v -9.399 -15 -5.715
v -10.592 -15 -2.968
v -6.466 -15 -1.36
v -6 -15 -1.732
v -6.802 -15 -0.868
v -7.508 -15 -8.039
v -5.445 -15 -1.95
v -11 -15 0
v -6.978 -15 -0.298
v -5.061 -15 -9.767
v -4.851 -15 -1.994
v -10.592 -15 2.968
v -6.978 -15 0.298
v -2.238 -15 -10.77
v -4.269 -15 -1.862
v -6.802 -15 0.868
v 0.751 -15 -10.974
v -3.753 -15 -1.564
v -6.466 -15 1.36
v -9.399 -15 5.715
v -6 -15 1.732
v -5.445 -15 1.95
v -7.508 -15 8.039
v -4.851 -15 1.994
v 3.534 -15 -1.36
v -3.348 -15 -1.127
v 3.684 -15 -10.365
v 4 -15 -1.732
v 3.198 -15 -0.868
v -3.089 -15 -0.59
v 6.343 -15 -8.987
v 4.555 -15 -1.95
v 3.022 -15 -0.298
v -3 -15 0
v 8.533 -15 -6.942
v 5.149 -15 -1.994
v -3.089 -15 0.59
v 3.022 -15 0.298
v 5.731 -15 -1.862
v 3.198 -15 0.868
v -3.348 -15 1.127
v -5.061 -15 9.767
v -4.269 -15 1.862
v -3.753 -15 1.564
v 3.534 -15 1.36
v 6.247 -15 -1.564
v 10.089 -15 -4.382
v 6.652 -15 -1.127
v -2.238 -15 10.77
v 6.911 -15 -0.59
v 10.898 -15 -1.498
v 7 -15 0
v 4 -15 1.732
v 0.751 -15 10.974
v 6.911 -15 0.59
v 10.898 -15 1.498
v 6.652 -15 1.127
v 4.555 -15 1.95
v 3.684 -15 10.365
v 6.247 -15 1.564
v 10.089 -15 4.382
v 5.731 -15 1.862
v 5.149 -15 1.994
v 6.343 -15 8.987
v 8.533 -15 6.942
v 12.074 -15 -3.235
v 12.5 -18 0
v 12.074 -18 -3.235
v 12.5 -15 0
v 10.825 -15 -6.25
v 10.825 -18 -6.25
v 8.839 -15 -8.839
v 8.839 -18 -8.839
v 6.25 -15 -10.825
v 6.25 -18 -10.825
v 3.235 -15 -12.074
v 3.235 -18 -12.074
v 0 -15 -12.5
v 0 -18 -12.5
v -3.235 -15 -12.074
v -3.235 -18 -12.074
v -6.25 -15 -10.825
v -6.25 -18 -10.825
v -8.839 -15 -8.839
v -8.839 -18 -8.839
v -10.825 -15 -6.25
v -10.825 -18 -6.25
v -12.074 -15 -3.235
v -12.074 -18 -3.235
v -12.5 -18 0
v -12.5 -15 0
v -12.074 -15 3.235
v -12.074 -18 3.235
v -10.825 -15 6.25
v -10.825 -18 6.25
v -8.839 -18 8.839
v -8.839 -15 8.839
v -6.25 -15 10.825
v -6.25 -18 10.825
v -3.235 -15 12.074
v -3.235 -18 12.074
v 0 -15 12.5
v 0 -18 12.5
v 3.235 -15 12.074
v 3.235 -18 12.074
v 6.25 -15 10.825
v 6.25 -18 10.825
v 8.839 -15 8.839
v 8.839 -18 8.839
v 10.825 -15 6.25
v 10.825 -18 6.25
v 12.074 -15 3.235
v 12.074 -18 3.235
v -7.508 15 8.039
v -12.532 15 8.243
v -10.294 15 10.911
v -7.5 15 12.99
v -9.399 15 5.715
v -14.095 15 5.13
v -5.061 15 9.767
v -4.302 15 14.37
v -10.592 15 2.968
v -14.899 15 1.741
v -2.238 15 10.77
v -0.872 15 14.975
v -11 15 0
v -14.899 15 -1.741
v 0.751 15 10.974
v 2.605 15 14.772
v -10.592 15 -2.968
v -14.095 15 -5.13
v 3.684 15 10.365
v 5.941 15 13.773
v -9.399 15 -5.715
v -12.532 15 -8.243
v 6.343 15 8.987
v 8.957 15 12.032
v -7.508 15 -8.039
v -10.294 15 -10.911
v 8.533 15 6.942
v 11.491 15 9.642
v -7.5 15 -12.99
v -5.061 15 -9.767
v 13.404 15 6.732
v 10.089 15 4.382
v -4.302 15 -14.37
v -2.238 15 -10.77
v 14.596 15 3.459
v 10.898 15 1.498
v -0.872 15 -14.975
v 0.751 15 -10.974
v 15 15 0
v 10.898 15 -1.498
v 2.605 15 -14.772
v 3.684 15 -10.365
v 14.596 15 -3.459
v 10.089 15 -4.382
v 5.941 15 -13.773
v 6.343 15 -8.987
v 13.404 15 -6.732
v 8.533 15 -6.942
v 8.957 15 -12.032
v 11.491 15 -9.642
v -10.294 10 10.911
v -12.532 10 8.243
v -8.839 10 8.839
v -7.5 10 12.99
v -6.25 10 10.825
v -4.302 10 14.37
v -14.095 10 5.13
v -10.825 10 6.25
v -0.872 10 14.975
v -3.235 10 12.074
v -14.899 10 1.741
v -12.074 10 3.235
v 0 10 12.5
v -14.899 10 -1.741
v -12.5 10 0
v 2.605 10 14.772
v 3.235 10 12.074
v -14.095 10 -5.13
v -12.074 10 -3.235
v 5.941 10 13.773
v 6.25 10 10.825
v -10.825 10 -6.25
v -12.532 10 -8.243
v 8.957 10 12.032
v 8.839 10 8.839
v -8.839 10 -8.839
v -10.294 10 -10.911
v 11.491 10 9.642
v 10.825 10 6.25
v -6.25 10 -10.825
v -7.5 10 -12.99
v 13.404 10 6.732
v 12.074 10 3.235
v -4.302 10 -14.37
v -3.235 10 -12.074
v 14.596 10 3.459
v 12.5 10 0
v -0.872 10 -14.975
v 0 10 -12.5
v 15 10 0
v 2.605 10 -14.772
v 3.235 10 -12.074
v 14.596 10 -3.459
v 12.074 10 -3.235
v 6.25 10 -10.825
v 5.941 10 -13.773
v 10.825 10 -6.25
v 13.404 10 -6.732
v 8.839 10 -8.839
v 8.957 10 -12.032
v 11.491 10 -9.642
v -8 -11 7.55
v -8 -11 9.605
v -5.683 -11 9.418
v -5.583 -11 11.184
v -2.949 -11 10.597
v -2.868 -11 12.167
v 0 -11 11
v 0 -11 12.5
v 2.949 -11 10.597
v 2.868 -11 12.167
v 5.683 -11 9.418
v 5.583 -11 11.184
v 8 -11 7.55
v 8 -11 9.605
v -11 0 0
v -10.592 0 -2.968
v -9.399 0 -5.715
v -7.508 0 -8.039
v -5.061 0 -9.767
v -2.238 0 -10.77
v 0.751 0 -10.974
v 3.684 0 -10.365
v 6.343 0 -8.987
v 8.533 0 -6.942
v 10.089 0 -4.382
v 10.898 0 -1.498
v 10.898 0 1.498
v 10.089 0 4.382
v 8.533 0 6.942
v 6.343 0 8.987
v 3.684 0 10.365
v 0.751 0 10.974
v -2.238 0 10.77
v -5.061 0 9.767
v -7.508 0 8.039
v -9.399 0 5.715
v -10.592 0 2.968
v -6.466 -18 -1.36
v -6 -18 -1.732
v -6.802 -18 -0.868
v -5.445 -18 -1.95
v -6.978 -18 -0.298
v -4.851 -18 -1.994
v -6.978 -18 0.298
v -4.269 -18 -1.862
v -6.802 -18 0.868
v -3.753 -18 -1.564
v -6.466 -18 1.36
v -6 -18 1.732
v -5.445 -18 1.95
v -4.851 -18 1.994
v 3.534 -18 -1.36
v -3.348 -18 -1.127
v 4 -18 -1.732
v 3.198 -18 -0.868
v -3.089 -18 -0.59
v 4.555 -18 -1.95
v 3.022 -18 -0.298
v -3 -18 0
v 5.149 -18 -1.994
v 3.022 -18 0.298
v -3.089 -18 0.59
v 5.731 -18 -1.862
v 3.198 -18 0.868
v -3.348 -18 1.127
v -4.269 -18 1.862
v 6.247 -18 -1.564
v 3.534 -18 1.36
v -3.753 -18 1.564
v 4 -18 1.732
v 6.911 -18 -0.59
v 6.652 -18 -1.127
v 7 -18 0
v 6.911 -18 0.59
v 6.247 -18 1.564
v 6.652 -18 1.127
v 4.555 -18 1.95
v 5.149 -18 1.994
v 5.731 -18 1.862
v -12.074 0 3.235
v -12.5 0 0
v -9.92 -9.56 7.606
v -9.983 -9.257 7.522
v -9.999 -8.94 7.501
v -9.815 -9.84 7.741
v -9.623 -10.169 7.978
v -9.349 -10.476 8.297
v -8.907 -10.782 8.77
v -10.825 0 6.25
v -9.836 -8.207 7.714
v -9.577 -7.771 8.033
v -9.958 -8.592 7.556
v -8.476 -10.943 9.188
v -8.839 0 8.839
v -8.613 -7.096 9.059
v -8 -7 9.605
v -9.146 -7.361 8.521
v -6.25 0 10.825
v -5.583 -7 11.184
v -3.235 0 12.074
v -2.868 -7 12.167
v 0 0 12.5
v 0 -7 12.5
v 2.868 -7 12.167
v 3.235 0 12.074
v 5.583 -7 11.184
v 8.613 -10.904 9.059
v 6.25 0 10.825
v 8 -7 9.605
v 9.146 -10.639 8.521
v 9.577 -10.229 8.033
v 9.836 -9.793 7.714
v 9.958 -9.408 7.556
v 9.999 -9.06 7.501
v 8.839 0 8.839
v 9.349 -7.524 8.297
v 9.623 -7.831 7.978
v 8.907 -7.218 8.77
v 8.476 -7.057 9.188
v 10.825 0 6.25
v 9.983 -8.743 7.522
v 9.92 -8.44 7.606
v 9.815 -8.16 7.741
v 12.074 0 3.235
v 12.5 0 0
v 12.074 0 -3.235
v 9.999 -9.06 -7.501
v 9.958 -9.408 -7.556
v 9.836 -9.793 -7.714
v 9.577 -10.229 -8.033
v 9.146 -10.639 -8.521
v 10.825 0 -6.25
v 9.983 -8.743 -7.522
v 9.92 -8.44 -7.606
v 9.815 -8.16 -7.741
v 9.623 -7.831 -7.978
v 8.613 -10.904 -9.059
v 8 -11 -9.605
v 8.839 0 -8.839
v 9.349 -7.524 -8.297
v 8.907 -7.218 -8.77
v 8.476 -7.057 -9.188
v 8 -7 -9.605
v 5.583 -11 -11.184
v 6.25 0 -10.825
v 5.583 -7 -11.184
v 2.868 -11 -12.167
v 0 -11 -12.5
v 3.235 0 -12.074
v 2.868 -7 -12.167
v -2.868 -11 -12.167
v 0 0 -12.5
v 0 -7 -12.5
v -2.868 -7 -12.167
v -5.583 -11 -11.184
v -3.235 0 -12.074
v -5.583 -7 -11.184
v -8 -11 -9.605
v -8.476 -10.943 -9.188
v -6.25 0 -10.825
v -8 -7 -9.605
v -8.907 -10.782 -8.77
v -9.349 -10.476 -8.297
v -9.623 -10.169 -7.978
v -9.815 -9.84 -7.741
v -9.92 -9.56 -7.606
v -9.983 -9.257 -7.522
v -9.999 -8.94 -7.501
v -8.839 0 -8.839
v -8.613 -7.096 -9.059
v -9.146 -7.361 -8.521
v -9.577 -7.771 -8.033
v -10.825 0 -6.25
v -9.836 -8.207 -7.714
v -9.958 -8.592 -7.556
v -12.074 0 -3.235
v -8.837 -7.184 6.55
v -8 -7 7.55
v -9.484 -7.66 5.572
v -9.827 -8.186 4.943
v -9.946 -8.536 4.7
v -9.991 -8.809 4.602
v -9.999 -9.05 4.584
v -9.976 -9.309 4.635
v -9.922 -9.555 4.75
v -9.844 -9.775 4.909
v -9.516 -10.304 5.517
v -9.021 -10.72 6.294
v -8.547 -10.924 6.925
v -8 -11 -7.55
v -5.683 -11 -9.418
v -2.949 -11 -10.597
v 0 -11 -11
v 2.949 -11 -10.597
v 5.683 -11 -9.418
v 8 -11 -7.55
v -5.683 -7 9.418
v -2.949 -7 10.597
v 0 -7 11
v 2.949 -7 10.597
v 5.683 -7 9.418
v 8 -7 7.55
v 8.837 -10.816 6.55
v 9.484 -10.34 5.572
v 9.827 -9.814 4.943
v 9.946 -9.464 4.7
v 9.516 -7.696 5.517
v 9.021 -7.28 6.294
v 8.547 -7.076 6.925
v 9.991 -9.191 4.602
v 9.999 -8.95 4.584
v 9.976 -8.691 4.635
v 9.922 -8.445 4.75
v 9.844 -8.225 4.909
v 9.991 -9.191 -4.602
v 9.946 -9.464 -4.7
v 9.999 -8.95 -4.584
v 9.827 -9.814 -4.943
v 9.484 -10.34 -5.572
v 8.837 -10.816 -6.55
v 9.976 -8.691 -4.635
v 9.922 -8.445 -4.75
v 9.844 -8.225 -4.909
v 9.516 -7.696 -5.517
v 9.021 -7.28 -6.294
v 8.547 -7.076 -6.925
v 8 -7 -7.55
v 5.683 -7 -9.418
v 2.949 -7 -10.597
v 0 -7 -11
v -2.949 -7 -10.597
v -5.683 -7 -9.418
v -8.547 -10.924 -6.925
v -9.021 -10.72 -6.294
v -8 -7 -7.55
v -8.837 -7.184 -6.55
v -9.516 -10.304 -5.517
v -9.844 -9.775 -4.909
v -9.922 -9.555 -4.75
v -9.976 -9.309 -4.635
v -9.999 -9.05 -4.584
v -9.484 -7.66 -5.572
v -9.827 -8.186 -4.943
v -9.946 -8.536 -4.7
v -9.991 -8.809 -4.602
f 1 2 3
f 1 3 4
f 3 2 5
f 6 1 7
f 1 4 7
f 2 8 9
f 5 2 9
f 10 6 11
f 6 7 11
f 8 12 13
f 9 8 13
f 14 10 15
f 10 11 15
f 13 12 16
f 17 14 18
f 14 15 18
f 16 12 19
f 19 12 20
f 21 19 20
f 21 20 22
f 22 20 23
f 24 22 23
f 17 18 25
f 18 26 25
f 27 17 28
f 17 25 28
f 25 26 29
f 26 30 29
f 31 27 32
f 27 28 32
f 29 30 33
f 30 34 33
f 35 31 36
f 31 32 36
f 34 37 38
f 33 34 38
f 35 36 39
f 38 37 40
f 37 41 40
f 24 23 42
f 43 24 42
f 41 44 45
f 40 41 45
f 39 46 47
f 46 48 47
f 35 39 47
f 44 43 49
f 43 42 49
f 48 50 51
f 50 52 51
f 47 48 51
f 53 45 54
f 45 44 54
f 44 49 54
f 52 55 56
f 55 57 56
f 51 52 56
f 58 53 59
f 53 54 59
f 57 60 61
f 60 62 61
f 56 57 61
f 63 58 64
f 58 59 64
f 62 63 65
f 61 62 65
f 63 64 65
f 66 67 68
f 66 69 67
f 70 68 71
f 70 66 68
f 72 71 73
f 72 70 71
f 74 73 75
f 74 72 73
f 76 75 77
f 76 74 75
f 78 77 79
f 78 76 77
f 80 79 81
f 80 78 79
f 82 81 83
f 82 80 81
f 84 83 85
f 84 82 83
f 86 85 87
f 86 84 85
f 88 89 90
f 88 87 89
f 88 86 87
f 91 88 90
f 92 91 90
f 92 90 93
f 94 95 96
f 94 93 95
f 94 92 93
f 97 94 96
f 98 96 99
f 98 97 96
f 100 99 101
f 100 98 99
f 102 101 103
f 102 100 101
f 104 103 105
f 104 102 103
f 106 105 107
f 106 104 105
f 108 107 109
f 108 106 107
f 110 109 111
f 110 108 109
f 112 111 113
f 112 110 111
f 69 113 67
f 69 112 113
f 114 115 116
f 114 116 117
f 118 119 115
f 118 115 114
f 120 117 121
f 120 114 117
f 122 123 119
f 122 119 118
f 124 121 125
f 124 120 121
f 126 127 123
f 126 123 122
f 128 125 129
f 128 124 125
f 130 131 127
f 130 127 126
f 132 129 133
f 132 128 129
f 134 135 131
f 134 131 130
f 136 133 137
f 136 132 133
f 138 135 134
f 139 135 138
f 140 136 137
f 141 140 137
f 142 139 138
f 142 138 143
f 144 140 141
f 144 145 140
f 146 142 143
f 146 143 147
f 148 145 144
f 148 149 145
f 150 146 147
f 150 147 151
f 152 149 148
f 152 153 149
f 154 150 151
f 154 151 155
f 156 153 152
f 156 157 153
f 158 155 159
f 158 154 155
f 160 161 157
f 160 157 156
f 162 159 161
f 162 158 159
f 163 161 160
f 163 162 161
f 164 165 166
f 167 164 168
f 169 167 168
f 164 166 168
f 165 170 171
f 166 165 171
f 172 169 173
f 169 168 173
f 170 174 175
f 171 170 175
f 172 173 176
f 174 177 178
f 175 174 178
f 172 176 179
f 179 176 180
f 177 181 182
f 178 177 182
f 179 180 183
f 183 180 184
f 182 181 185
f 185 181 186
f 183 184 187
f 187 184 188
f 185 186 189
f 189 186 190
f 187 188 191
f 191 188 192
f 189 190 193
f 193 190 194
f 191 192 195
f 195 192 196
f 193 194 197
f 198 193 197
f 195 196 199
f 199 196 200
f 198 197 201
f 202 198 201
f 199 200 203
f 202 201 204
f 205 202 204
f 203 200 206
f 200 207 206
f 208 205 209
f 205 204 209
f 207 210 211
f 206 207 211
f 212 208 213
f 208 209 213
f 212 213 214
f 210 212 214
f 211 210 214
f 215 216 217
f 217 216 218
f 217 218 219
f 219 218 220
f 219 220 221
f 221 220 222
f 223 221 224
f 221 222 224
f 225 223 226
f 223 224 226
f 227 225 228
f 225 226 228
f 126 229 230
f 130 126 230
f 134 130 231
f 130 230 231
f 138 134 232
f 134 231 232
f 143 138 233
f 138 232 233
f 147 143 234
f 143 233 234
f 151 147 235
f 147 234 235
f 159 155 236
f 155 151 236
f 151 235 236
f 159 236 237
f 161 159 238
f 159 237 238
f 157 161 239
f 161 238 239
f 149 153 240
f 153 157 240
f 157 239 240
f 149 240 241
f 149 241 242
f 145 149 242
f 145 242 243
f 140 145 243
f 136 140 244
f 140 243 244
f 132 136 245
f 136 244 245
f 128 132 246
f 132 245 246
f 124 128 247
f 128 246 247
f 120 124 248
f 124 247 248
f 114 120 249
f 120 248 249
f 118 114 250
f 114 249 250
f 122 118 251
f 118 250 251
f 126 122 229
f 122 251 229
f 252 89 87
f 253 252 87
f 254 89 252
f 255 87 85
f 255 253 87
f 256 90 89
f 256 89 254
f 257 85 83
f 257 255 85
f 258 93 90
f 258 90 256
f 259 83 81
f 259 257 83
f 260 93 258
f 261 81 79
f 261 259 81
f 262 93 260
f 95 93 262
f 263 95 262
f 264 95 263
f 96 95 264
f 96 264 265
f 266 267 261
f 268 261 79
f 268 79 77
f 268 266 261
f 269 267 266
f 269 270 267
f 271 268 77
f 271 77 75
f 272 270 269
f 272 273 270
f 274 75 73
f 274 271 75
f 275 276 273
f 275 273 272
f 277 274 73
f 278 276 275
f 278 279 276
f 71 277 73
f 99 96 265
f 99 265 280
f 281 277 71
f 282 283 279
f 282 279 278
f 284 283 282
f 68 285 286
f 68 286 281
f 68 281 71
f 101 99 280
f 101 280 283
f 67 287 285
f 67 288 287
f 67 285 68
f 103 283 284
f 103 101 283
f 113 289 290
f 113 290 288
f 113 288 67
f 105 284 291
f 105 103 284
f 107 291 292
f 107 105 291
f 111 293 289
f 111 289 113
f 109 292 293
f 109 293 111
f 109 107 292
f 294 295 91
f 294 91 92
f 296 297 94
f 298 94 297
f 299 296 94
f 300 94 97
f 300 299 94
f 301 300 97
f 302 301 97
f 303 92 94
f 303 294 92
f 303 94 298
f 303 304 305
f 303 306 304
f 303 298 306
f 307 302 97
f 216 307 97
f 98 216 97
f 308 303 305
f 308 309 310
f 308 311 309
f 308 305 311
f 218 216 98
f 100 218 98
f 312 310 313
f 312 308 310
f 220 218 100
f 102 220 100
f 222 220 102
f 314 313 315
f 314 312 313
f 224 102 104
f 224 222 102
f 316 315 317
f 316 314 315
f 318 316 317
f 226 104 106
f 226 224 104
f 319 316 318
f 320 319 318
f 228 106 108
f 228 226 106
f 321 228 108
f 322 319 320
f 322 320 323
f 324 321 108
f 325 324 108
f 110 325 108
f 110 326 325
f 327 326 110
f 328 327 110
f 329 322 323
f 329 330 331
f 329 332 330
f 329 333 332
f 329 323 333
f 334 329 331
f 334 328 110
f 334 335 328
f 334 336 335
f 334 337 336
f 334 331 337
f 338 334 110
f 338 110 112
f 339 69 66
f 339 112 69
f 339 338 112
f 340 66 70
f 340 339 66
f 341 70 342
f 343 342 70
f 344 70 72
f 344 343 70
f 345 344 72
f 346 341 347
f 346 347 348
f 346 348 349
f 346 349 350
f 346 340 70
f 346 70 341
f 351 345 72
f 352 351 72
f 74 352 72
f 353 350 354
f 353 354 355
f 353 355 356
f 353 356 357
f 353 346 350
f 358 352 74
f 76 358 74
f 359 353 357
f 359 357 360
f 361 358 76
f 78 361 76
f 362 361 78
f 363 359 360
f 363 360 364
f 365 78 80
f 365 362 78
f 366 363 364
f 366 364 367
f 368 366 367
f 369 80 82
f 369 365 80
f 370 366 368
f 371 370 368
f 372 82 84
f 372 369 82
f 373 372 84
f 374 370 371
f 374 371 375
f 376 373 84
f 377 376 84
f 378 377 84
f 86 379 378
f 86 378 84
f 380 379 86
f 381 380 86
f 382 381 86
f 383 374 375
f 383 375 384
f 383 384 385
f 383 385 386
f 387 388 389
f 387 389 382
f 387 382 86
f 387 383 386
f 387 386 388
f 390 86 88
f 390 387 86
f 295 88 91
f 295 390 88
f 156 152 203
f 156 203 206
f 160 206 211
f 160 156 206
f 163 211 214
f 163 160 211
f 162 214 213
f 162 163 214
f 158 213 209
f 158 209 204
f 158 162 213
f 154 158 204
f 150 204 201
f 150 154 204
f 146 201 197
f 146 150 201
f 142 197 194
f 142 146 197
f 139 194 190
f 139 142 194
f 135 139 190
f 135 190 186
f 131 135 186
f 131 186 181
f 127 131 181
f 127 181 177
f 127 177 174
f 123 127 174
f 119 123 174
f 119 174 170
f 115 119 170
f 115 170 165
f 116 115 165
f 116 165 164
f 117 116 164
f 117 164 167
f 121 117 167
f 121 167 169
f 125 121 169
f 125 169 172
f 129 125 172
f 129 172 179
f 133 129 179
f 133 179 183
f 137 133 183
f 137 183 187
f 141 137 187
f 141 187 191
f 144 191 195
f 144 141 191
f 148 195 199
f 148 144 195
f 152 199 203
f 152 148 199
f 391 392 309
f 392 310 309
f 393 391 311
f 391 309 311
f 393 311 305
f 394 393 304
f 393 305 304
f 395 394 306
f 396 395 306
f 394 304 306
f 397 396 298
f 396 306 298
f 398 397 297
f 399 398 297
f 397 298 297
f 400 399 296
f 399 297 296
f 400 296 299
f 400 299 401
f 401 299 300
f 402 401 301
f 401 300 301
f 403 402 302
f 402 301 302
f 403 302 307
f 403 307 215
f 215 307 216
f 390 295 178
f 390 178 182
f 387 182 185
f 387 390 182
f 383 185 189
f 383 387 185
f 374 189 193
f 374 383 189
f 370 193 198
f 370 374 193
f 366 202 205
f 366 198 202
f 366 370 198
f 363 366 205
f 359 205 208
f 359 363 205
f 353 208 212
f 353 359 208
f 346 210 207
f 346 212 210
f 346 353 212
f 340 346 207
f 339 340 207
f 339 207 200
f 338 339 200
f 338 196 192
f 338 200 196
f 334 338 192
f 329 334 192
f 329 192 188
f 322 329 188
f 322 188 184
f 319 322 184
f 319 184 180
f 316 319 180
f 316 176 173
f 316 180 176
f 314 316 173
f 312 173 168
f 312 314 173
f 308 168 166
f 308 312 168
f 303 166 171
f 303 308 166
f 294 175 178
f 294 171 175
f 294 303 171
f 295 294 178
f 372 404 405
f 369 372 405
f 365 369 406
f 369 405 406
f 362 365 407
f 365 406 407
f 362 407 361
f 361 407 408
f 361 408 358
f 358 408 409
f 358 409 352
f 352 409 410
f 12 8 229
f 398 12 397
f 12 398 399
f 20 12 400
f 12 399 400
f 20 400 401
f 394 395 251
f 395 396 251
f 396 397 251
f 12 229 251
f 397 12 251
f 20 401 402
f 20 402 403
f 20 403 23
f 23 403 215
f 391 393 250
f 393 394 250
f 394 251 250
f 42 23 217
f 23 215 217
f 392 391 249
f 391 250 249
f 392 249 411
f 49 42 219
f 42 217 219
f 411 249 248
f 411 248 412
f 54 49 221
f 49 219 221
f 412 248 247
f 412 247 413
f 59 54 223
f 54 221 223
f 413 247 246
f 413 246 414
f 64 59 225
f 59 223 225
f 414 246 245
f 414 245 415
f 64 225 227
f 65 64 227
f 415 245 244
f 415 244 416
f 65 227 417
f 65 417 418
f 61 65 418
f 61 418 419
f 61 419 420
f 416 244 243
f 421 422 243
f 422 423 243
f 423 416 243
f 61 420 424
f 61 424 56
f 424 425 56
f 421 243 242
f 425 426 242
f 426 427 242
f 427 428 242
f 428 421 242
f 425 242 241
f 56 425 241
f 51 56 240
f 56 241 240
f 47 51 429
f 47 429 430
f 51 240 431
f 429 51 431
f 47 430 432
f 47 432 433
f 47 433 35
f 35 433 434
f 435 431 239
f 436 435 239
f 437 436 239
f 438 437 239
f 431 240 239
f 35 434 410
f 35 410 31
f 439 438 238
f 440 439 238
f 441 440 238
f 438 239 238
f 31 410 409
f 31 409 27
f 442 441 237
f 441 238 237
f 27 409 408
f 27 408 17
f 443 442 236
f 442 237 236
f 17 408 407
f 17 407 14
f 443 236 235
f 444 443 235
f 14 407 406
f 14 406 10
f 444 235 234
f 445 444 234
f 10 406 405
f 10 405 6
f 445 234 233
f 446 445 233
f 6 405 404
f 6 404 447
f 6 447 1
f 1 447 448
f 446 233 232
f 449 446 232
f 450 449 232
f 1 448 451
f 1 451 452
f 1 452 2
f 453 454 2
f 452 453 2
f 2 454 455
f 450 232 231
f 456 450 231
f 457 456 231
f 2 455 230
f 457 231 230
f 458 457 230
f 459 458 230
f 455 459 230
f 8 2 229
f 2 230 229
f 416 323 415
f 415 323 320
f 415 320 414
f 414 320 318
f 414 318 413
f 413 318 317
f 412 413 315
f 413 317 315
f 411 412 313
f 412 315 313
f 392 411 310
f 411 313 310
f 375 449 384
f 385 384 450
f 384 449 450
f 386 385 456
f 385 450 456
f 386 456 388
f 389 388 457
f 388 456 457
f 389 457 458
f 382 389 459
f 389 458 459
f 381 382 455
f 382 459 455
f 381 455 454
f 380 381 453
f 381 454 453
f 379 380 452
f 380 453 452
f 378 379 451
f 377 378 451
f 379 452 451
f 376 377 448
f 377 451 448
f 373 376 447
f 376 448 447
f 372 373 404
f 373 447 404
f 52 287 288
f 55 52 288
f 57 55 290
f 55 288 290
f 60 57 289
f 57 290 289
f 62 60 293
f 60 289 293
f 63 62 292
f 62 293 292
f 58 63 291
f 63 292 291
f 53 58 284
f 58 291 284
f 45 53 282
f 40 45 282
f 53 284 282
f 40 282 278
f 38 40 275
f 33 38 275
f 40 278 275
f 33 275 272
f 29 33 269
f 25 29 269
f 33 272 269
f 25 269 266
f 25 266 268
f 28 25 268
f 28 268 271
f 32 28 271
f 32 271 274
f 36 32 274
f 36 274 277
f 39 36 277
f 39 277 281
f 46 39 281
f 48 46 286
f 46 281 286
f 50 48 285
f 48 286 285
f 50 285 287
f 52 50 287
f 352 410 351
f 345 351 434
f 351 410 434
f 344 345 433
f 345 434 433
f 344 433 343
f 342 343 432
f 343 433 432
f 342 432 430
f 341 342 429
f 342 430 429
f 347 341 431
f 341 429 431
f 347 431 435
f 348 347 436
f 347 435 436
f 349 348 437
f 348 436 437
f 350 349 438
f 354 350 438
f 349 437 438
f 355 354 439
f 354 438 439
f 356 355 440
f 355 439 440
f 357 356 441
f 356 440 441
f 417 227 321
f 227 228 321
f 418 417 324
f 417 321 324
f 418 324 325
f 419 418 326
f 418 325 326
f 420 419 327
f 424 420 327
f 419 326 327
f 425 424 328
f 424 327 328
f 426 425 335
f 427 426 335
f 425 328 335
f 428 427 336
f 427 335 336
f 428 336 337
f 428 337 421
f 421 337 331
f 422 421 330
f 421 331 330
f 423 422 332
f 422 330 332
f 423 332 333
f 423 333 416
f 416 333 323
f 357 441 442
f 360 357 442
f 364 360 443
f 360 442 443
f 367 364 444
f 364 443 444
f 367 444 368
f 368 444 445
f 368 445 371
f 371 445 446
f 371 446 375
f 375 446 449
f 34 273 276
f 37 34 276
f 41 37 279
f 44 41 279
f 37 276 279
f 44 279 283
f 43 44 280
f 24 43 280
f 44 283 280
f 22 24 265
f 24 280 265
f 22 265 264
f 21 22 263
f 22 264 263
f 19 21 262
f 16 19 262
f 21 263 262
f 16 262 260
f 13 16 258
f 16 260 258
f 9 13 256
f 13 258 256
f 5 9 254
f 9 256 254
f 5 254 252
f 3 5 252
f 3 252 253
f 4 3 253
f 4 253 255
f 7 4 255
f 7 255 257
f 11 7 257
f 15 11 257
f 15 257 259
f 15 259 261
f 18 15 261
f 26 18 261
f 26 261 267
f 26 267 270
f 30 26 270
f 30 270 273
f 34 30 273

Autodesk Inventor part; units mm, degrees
ref_plane "YZ Plane" through (0, 0, 0) normal (1, 0, 0) x (0, 1, 0)
ref_plane "XZ Plane" through (0, 0, 0) normal (0, 1, 0) x (-1, 0, 0)
ref_plane "XY Plane" through (0, 0, 0) normal (0, 0, 1) x (1, 0, 0)
sketch "Sketch1" plane through (0, 0, 0) normal (0, 1, 0) x (-1, 0, 0)
  circle A0 centre (0, 0) radius 12.5
  circle A1 centre (0, 0) radius 11
  dimension "d0" = 25
  dimension "d1" = 22
extrude "Extrusion1" add sketch "Sketch1" along normal mid plane 30
sketch "Sketch2" plane through (0, 15, 0) normal (0, 1, 0) x (1, 0, 0)
  circle A0 centre (0, 0) radius 15
  circle A1 centre (0, 0) radius 12.5
  dimension "d4" = 30
extrude "Extrusion2" add sketch "Sketch2" against normal blind 5
sketch "Sketch3" plane through (0, -15, 0) normal (0, -1, 0) x (1, 0, 0)
  circle A0 centre (0, 0) radius 12.5
extrude "Extrusion3" add sketch "Sketch3" along normal blind 3
sketch "Sketch4" plane through (0, -18, 0) normal (0, -1, 0) x (1, 0, 0)
  line L0 (0, 0) -> (-5, 0)
  line L1 (0, 0) -> (5, 0)
  circle A0 centre (-5, 0) radius 2
  circle A1 centre (5, 0) radius 2
  dimension "d21" = 5
  dimension "d22" = 5
  dimension "d23" = 4
  dimension "d24" = 4
extrude "Extrusion4" cut sketch "Sketch4" against normal through all
sketch "Sketch6" plane through (0, 0, 0) normal (0, 0, 1) x (1, 0, 0)
  line L0 (-12.5, 10) -> (12.5, 10) construction
  line L1 (0, 10) -> (0, 0) construction
  line L2 (0, 0) -> (0, -9) construction
  line L3 (-12.5, -18) -> (12.5, -18) construction
  line L4 (0, -9) -> (-8, -9) construction
  line L5 (-8, -9) -> (8, -9) construction
  line L6 (-8, -11) -> (8, -11)
  line L7 (8, -7) -> (-8, -7)
  arc A0 (-8, -7) -> (-8, -11) centre (-8, -9) ccw
  arc A1 (8, -11) -> (8, -7) centre (8, -9) ccw
  dimension "d14" = 10
  dimension "d15" = 9
  dimension "d16" = 8
  dimension "d17" = 16
  dimension "d18" = 4
extrude "Extrusion6" cut sketch "Sketch6" against normal through all both and the other way through all
equation "\"d21\" = d22"
properties part number "EndEffectorRotational" material "ABS Plastic"
